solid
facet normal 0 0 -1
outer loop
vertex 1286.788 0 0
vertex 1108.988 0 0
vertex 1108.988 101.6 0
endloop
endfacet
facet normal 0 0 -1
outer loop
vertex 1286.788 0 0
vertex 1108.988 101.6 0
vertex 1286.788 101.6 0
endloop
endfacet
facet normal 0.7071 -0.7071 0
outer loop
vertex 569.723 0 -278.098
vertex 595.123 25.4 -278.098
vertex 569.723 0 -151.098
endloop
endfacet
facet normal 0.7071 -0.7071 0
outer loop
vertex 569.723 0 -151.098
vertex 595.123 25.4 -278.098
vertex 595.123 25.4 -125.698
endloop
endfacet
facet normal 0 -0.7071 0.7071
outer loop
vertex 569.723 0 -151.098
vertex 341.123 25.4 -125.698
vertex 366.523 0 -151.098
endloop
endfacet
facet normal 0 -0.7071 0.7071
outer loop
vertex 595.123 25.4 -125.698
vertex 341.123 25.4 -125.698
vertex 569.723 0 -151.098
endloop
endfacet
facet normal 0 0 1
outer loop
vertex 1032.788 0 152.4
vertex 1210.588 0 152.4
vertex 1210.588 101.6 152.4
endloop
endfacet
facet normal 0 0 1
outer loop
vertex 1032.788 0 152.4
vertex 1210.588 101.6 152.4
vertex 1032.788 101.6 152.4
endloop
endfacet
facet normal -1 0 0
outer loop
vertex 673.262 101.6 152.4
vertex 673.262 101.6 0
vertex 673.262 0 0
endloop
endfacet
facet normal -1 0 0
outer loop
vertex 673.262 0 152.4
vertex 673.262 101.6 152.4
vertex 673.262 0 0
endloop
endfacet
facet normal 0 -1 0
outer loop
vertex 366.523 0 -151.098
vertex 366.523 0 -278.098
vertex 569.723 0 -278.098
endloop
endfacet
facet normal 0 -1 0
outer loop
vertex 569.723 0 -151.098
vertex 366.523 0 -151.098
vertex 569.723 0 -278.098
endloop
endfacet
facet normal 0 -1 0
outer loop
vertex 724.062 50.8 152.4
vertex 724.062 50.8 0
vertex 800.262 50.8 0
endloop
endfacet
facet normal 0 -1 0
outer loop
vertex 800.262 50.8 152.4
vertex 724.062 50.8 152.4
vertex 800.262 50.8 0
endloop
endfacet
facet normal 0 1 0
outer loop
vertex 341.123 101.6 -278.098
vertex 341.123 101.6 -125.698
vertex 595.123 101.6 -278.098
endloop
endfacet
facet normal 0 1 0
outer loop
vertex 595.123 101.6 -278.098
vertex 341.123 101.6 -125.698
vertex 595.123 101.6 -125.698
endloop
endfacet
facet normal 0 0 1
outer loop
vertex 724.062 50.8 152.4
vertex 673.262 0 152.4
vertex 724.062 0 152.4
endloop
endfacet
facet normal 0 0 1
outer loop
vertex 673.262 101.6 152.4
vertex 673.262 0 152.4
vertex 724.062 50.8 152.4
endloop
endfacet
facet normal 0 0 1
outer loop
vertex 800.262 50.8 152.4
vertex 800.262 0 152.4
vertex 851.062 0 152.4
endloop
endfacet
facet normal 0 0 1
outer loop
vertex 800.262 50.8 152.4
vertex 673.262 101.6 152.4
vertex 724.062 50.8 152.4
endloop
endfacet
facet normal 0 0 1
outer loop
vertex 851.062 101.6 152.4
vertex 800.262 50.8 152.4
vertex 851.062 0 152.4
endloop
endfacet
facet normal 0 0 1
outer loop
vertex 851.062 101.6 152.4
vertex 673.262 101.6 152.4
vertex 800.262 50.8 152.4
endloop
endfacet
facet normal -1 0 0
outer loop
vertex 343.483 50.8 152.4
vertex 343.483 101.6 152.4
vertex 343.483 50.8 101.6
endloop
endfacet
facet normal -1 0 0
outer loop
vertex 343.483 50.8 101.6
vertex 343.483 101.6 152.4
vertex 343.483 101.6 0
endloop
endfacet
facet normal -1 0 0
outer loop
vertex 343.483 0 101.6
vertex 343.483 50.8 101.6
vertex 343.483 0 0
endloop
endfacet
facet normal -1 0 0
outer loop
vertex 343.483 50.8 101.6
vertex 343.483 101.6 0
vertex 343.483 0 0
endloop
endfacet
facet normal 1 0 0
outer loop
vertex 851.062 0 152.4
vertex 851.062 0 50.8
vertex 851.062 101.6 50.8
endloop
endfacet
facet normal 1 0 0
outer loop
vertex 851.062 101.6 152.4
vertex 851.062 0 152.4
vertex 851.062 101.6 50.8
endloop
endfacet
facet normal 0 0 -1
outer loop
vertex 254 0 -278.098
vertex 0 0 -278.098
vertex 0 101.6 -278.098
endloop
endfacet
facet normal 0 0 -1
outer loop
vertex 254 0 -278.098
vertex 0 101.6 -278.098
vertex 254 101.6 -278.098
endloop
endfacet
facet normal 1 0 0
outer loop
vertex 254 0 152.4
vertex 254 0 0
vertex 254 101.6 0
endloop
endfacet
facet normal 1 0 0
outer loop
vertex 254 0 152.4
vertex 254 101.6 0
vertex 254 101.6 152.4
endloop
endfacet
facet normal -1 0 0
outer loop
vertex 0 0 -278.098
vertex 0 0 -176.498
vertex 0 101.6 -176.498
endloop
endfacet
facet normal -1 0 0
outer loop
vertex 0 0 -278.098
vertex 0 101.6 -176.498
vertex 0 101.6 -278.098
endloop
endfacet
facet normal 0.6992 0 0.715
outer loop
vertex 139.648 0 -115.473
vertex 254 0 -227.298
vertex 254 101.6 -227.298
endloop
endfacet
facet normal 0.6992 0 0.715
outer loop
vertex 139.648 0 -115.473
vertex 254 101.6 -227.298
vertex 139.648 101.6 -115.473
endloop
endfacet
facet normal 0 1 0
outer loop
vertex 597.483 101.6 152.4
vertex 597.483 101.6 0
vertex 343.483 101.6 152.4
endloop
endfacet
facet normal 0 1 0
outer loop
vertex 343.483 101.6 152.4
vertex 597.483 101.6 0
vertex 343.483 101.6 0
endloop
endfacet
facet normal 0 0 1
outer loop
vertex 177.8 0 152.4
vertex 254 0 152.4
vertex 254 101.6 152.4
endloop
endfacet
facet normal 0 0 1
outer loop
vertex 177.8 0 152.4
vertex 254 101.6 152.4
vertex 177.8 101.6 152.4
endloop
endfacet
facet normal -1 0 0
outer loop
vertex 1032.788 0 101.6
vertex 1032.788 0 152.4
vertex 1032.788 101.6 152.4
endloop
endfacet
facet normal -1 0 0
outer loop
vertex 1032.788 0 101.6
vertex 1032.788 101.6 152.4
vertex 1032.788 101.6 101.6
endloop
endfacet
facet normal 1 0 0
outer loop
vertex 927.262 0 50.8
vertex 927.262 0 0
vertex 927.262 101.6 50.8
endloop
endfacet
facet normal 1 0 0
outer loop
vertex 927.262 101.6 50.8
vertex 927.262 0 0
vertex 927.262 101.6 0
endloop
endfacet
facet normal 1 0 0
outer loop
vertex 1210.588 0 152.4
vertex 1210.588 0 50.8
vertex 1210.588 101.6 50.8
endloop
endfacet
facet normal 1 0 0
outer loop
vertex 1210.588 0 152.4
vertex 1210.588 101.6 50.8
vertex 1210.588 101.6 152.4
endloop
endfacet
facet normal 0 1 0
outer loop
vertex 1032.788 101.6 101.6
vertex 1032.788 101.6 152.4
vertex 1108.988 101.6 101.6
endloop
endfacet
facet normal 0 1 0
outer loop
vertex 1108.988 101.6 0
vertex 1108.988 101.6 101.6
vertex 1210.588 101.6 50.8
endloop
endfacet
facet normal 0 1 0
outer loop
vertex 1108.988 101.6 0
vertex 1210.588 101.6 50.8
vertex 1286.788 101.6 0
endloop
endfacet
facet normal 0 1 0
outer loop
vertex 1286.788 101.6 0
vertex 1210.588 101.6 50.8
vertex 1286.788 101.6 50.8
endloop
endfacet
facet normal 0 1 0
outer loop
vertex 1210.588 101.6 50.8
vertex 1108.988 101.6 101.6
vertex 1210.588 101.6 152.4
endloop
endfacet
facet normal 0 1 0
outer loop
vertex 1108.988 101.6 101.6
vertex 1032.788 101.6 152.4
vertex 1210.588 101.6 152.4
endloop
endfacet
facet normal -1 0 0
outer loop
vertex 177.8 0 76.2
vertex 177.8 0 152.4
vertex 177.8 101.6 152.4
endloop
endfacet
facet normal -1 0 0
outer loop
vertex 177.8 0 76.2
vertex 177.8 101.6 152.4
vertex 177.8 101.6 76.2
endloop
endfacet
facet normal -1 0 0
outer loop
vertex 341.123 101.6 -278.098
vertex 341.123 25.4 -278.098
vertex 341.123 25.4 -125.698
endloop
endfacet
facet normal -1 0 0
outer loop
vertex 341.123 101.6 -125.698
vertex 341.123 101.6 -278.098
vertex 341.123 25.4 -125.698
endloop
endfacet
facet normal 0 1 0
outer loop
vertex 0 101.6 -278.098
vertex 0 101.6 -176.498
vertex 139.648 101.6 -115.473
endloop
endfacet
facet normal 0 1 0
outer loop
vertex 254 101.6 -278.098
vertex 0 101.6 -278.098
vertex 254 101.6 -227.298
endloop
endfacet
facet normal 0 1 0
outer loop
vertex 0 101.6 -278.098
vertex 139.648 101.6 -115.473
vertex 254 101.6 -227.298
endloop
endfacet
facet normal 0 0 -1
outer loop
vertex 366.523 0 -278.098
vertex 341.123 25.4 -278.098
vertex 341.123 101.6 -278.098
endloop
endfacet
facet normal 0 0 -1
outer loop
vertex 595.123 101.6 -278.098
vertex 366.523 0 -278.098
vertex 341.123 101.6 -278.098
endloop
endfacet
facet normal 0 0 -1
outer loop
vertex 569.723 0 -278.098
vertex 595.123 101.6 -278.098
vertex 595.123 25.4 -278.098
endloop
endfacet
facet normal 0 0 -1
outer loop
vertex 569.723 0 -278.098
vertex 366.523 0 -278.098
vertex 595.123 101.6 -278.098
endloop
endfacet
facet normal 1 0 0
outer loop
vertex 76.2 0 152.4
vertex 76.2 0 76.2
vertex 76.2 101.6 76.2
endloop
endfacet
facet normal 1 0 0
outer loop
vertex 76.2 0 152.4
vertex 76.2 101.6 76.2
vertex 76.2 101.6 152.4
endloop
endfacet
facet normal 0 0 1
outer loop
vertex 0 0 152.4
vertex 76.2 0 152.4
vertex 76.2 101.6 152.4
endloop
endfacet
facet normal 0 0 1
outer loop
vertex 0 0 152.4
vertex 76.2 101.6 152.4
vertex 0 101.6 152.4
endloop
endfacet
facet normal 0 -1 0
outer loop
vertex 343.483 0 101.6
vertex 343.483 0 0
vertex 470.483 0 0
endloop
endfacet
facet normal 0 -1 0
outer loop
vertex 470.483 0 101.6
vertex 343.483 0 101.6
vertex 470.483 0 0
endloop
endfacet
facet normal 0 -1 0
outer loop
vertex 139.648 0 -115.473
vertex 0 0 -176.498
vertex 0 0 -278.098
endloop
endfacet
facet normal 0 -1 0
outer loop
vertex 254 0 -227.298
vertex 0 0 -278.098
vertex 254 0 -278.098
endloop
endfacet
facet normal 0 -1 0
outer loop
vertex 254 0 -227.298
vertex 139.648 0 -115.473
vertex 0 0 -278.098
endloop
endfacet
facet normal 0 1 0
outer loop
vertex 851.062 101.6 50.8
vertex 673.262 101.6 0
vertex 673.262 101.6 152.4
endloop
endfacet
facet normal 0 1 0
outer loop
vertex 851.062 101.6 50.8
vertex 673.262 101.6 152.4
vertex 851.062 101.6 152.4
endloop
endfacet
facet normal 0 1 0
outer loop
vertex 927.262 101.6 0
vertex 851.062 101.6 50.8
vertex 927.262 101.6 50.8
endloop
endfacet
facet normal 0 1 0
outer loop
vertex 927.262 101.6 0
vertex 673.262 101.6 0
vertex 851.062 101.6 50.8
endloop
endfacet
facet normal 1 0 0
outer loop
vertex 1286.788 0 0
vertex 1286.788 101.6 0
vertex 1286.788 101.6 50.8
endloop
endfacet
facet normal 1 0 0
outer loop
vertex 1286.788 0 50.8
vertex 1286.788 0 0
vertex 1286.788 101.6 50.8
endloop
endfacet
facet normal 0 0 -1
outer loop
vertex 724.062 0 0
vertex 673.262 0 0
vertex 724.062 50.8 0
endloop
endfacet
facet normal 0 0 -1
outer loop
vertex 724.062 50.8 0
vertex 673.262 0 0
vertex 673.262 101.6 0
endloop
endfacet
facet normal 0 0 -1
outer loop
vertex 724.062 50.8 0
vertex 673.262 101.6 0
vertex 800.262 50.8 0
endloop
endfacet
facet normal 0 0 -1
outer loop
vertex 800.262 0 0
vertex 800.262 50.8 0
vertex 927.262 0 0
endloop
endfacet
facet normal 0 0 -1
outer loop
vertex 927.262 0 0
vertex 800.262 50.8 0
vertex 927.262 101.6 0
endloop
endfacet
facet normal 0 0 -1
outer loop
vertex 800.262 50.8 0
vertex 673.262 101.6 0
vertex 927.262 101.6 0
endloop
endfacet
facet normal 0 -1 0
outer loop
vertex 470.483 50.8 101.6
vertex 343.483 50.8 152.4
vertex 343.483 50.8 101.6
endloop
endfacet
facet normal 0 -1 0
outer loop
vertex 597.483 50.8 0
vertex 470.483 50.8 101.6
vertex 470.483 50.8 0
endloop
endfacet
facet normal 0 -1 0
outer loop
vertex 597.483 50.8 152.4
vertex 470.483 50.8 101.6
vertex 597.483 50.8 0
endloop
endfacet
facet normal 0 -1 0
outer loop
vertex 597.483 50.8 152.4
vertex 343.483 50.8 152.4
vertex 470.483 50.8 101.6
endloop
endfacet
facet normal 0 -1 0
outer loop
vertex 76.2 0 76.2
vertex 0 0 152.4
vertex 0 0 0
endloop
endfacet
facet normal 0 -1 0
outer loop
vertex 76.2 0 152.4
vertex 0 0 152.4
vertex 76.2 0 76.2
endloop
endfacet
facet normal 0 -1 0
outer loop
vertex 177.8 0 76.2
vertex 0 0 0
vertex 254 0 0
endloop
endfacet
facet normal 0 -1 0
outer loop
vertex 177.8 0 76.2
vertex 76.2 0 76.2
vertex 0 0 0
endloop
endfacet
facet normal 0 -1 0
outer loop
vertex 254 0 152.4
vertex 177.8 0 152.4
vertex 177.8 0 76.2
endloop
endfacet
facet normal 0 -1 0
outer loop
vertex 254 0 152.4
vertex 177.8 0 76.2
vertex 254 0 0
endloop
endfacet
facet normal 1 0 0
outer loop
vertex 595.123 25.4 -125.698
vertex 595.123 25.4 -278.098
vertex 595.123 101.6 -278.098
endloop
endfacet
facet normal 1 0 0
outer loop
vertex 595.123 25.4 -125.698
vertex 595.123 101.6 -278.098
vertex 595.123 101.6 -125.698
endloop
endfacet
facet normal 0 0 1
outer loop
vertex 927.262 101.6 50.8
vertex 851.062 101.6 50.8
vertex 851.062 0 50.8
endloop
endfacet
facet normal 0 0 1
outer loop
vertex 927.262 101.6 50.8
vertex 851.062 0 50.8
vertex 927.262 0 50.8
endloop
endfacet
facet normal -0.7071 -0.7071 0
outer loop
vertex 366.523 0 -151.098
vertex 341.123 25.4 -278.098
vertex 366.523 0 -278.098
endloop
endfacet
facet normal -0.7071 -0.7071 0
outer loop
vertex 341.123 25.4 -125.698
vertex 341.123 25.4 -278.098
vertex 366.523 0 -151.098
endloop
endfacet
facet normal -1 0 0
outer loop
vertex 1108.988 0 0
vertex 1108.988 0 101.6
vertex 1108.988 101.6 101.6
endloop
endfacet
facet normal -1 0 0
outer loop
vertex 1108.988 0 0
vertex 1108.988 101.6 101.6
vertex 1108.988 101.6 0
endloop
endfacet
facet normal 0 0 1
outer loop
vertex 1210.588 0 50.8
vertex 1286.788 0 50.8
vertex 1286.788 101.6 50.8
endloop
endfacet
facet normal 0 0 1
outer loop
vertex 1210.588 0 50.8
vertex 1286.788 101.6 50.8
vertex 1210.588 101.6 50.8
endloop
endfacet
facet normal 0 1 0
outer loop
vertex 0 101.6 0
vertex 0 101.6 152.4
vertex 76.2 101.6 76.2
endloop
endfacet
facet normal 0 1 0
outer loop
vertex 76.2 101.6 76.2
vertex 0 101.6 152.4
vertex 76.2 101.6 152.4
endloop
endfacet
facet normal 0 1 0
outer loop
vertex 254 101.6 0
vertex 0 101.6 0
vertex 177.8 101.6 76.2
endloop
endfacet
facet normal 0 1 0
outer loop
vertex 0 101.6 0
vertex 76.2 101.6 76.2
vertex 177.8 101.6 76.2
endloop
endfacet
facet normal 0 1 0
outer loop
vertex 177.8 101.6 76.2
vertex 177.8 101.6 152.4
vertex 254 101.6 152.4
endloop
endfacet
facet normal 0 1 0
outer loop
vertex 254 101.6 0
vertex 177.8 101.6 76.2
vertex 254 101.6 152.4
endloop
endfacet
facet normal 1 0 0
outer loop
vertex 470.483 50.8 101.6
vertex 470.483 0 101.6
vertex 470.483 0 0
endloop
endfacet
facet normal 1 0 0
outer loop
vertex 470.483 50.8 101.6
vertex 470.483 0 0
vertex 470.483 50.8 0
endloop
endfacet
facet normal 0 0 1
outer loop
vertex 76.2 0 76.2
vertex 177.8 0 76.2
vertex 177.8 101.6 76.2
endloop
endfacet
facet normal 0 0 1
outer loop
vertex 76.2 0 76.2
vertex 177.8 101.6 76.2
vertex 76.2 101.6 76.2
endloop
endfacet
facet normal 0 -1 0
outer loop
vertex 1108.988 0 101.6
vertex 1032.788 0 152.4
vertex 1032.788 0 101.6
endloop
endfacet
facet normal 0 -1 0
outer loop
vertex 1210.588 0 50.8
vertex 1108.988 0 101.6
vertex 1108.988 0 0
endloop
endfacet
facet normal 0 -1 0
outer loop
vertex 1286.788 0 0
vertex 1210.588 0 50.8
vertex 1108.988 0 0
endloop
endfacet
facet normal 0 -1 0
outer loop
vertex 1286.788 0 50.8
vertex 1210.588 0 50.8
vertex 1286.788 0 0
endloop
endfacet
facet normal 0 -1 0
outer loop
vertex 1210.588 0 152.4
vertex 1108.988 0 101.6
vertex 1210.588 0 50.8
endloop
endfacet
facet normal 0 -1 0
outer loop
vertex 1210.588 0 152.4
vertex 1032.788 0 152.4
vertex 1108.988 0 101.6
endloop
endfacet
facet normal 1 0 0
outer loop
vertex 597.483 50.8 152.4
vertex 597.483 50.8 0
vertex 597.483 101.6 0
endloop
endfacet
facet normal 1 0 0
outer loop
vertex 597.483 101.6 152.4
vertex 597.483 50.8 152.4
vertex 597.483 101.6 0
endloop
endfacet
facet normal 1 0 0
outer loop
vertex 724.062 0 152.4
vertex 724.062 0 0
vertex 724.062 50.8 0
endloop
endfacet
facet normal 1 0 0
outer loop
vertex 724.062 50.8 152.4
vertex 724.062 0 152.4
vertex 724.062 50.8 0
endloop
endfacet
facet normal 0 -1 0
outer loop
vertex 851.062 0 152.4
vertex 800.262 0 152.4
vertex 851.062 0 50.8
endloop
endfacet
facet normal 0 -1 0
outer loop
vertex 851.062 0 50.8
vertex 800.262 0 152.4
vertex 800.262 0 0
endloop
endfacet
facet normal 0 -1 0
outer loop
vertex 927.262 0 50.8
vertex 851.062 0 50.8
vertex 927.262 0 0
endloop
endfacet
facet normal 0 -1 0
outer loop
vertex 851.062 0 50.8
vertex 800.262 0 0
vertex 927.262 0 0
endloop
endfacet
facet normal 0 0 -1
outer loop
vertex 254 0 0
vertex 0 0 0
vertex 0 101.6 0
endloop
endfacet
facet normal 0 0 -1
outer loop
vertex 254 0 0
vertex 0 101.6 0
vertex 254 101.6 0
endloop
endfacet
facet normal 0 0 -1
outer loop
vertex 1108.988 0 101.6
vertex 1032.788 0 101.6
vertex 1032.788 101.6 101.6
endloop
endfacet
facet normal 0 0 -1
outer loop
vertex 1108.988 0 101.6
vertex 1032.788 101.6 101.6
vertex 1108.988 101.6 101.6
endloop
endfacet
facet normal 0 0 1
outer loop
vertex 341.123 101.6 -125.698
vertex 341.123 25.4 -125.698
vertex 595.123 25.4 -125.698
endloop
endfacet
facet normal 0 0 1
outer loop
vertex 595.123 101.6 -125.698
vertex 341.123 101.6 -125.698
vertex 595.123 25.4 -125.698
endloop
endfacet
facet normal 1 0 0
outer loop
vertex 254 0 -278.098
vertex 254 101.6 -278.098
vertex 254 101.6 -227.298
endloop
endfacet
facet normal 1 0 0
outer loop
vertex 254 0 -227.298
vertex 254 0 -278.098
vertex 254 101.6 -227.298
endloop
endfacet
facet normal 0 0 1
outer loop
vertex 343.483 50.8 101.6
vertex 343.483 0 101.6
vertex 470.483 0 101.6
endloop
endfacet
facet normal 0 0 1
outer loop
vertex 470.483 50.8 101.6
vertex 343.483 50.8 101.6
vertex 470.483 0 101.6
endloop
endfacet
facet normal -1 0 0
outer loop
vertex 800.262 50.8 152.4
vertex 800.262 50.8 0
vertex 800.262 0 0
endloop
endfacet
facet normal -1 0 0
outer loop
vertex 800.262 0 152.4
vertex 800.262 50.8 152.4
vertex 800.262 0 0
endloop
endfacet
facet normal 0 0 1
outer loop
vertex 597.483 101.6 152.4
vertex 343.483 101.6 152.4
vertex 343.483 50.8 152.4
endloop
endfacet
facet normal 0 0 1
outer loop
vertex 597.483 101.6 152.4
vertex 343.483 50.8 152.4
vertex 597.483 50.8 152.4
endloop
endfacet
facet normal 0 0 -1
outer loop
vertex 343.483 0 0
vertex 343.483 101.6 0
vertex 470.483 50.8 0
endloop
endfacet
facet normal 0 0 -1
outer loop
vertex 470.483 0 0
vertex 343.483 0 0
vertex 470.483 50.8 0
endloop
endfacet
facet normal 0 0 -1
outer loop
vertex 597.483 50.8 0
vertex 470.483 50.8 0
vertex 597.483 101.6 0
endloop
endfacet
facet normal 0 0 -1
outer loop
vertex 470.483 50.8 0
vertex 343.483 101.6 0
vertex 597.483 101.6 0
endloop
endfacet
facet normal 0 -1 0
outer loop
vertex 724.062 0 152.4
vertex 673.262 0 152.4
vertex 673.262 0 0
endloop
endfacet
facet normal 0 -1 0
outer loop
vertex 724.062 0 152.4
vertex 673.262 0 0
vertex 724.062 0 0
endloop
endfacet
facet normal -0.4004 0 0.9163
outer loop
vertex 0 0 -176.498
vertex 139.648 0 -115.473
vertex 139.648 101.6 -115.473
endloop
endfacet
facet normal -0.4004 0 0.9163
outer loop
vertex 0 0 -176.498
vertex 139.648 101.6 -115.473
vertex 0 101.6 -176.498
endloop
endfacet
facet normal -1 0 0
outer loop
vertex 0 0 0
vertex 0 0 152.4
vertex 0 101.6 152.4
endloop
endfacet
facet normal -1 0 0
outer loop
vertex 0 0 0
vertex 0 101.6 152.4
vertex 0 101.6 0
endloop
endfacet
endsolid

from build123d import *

# Parameters (mm, degrees)
F1_DEPTH   = 101.6
F3_DEPTH   = 152.4
F5_DEPTH   = 152.4
F4_W       = 76.2
F4_H       = 101.6
F6_DEPTH   = 50.8
F7_DEPTH   = 152.4
F9_W       = 127
F9_H       = 50.8
F10_DEPTH  = 50.8
F12_DEPTH  = 101.6
F14_DEPTH  = 101.6
F15_W      = 254
F15_H      = 152.4
F15_W_2    = 203.2
F15_H_2    = 101.6
F16_DEPTH  = 101.6
F16_FACE_W = 203.2
F16_FACE_H = 101.6
F17_DEPTH  = 109.22
F18_SIZE   = 25.4


with BuildPart() as f1:
    # F0 (on Front) → F1 (new body)
    with BuildSketch(Plane.XZ):
        Polygon((0, 152.4), (0, 0), (254, 0), (254, 152.4), (177.8, 152.4), (177.8, 76.2), (76.2, 76.2), (76.2, 152.4), align=None)
    extrude(amount=-F1_DEPTH)


with BuildPart() as f3:
    # F2 (on Top) → F3 (new body)
    with BuildSketch(Plane.XY):
        Polygon((343.48328, 101.6), (343.48328, 0), (470.48328, 0), (470.48328, 50.8), (597.48328, 50.8), (597.48328, 76.2), (597.48328, 101.6), align=None)
    extrude(amount=F3_DEPTH)

    # F2 (on Top) → F7 (join)
    with BuildSketch(Plane.XY):
        Polygon((343.48328, 101.6), (343.48328, 0), (470.48328, 0), (470.48328, 50.8), (597.48328, 50.8), (597.48328, 76.2), (597.48328, 101.6), align=None)
    extrude(amount=F7_DEPTH)

    # F9 (on face) → F10 (cut)
    with BuildSketch(Plane.XZ):
        with Locations((406.98328, 127)):
            Rectangle(F9_W, F9_H)
    extrude(amount=-F10_DEPTH, mode=Mode.SUBTRACT)


with BuildPart() as f5:
    # F4 (on Top) → F5 (new body)
    with BuildSketch(Plane.XY):
        Polygon((673.262379, 101.6), (673.262379, 0), (724.062379, 0), (724.062379, 50.8), (800.262379, 50.8), (800.262379, 0), (851.062379, 0), (851.062379, 101.6), align=None)
    extrude(amount=F5_DEPTH)

    # F4 (on Top) → F6 (join)
    with BuildSketch(Plane.XY):
        with Locations((889.162379, 50.8)):
            Rectangle(F4_W, F4_H)
    extrude(amount=F6_DEPTH)


with BuildPart() as f12:
    # F11 (on face) → F12 (new body)
    with BuildSketch(Plane.XZ):
        Polygon((1032.7878, 152.4), (1032.7878, 101.6), (1108.9878, 101.6), (1108.9878, 0), (1286.7878, 0), (1286.7878, 50.8), (1210.5878, 50.8), (1210.5878, 152.4), align=None)
    extrude(amount=-F12_DEPTH)


with BuildPart() as f14:
    # F13 (on Front) → F14 (new body)
    with BuildSketch(Plane.XZ):
        Polygon((0, -176.498294), (0, -278.098294), (254, -278.098294), (254, -227.298294), (139.648388, -115.47299), align=None)
    extrude(amount=-F14_DEPTH)


with BuildPart() as f16:
    # F15 (on face) → F16 (new body)
    with BuildSketch(Plane.XZ):
        with Locations((468.123402, -201.898294)):
            Rectangle(F15_W, F15_H)
        with Locations((465.806254, -200.559135)):
            Rectangle(F15_W_2, F15_H_2, mode=Mode.SUBTRACT)
    extrude(amount=-F16_DEPTH)

    # F16_face (on face) → F17 (join)
    with BuildSketch(Plane(origin=(465.806254, 50.8, -251.359135), x_dir=(1, 0, 0), z_dir=(0, 0, 1))):
        Rectangle(F16_FACE_W, F16_FACE_H)
    extrude(amount=F17_DEPTH)

    # F18
    f18_edges = [f16.edges().sort_by_distance(p)[0] for p in [
        (468.123402, 0, -125.698294),
        (595.123402, 0, -201.898294),
        (341.123402, 0, -201.898294),
    ]]
    chamfer(f18_edges, length=F18_SIZE)


solid = Compound([f1.part, f3.part, f5.part, f12.part, f14.part, f16.part])
